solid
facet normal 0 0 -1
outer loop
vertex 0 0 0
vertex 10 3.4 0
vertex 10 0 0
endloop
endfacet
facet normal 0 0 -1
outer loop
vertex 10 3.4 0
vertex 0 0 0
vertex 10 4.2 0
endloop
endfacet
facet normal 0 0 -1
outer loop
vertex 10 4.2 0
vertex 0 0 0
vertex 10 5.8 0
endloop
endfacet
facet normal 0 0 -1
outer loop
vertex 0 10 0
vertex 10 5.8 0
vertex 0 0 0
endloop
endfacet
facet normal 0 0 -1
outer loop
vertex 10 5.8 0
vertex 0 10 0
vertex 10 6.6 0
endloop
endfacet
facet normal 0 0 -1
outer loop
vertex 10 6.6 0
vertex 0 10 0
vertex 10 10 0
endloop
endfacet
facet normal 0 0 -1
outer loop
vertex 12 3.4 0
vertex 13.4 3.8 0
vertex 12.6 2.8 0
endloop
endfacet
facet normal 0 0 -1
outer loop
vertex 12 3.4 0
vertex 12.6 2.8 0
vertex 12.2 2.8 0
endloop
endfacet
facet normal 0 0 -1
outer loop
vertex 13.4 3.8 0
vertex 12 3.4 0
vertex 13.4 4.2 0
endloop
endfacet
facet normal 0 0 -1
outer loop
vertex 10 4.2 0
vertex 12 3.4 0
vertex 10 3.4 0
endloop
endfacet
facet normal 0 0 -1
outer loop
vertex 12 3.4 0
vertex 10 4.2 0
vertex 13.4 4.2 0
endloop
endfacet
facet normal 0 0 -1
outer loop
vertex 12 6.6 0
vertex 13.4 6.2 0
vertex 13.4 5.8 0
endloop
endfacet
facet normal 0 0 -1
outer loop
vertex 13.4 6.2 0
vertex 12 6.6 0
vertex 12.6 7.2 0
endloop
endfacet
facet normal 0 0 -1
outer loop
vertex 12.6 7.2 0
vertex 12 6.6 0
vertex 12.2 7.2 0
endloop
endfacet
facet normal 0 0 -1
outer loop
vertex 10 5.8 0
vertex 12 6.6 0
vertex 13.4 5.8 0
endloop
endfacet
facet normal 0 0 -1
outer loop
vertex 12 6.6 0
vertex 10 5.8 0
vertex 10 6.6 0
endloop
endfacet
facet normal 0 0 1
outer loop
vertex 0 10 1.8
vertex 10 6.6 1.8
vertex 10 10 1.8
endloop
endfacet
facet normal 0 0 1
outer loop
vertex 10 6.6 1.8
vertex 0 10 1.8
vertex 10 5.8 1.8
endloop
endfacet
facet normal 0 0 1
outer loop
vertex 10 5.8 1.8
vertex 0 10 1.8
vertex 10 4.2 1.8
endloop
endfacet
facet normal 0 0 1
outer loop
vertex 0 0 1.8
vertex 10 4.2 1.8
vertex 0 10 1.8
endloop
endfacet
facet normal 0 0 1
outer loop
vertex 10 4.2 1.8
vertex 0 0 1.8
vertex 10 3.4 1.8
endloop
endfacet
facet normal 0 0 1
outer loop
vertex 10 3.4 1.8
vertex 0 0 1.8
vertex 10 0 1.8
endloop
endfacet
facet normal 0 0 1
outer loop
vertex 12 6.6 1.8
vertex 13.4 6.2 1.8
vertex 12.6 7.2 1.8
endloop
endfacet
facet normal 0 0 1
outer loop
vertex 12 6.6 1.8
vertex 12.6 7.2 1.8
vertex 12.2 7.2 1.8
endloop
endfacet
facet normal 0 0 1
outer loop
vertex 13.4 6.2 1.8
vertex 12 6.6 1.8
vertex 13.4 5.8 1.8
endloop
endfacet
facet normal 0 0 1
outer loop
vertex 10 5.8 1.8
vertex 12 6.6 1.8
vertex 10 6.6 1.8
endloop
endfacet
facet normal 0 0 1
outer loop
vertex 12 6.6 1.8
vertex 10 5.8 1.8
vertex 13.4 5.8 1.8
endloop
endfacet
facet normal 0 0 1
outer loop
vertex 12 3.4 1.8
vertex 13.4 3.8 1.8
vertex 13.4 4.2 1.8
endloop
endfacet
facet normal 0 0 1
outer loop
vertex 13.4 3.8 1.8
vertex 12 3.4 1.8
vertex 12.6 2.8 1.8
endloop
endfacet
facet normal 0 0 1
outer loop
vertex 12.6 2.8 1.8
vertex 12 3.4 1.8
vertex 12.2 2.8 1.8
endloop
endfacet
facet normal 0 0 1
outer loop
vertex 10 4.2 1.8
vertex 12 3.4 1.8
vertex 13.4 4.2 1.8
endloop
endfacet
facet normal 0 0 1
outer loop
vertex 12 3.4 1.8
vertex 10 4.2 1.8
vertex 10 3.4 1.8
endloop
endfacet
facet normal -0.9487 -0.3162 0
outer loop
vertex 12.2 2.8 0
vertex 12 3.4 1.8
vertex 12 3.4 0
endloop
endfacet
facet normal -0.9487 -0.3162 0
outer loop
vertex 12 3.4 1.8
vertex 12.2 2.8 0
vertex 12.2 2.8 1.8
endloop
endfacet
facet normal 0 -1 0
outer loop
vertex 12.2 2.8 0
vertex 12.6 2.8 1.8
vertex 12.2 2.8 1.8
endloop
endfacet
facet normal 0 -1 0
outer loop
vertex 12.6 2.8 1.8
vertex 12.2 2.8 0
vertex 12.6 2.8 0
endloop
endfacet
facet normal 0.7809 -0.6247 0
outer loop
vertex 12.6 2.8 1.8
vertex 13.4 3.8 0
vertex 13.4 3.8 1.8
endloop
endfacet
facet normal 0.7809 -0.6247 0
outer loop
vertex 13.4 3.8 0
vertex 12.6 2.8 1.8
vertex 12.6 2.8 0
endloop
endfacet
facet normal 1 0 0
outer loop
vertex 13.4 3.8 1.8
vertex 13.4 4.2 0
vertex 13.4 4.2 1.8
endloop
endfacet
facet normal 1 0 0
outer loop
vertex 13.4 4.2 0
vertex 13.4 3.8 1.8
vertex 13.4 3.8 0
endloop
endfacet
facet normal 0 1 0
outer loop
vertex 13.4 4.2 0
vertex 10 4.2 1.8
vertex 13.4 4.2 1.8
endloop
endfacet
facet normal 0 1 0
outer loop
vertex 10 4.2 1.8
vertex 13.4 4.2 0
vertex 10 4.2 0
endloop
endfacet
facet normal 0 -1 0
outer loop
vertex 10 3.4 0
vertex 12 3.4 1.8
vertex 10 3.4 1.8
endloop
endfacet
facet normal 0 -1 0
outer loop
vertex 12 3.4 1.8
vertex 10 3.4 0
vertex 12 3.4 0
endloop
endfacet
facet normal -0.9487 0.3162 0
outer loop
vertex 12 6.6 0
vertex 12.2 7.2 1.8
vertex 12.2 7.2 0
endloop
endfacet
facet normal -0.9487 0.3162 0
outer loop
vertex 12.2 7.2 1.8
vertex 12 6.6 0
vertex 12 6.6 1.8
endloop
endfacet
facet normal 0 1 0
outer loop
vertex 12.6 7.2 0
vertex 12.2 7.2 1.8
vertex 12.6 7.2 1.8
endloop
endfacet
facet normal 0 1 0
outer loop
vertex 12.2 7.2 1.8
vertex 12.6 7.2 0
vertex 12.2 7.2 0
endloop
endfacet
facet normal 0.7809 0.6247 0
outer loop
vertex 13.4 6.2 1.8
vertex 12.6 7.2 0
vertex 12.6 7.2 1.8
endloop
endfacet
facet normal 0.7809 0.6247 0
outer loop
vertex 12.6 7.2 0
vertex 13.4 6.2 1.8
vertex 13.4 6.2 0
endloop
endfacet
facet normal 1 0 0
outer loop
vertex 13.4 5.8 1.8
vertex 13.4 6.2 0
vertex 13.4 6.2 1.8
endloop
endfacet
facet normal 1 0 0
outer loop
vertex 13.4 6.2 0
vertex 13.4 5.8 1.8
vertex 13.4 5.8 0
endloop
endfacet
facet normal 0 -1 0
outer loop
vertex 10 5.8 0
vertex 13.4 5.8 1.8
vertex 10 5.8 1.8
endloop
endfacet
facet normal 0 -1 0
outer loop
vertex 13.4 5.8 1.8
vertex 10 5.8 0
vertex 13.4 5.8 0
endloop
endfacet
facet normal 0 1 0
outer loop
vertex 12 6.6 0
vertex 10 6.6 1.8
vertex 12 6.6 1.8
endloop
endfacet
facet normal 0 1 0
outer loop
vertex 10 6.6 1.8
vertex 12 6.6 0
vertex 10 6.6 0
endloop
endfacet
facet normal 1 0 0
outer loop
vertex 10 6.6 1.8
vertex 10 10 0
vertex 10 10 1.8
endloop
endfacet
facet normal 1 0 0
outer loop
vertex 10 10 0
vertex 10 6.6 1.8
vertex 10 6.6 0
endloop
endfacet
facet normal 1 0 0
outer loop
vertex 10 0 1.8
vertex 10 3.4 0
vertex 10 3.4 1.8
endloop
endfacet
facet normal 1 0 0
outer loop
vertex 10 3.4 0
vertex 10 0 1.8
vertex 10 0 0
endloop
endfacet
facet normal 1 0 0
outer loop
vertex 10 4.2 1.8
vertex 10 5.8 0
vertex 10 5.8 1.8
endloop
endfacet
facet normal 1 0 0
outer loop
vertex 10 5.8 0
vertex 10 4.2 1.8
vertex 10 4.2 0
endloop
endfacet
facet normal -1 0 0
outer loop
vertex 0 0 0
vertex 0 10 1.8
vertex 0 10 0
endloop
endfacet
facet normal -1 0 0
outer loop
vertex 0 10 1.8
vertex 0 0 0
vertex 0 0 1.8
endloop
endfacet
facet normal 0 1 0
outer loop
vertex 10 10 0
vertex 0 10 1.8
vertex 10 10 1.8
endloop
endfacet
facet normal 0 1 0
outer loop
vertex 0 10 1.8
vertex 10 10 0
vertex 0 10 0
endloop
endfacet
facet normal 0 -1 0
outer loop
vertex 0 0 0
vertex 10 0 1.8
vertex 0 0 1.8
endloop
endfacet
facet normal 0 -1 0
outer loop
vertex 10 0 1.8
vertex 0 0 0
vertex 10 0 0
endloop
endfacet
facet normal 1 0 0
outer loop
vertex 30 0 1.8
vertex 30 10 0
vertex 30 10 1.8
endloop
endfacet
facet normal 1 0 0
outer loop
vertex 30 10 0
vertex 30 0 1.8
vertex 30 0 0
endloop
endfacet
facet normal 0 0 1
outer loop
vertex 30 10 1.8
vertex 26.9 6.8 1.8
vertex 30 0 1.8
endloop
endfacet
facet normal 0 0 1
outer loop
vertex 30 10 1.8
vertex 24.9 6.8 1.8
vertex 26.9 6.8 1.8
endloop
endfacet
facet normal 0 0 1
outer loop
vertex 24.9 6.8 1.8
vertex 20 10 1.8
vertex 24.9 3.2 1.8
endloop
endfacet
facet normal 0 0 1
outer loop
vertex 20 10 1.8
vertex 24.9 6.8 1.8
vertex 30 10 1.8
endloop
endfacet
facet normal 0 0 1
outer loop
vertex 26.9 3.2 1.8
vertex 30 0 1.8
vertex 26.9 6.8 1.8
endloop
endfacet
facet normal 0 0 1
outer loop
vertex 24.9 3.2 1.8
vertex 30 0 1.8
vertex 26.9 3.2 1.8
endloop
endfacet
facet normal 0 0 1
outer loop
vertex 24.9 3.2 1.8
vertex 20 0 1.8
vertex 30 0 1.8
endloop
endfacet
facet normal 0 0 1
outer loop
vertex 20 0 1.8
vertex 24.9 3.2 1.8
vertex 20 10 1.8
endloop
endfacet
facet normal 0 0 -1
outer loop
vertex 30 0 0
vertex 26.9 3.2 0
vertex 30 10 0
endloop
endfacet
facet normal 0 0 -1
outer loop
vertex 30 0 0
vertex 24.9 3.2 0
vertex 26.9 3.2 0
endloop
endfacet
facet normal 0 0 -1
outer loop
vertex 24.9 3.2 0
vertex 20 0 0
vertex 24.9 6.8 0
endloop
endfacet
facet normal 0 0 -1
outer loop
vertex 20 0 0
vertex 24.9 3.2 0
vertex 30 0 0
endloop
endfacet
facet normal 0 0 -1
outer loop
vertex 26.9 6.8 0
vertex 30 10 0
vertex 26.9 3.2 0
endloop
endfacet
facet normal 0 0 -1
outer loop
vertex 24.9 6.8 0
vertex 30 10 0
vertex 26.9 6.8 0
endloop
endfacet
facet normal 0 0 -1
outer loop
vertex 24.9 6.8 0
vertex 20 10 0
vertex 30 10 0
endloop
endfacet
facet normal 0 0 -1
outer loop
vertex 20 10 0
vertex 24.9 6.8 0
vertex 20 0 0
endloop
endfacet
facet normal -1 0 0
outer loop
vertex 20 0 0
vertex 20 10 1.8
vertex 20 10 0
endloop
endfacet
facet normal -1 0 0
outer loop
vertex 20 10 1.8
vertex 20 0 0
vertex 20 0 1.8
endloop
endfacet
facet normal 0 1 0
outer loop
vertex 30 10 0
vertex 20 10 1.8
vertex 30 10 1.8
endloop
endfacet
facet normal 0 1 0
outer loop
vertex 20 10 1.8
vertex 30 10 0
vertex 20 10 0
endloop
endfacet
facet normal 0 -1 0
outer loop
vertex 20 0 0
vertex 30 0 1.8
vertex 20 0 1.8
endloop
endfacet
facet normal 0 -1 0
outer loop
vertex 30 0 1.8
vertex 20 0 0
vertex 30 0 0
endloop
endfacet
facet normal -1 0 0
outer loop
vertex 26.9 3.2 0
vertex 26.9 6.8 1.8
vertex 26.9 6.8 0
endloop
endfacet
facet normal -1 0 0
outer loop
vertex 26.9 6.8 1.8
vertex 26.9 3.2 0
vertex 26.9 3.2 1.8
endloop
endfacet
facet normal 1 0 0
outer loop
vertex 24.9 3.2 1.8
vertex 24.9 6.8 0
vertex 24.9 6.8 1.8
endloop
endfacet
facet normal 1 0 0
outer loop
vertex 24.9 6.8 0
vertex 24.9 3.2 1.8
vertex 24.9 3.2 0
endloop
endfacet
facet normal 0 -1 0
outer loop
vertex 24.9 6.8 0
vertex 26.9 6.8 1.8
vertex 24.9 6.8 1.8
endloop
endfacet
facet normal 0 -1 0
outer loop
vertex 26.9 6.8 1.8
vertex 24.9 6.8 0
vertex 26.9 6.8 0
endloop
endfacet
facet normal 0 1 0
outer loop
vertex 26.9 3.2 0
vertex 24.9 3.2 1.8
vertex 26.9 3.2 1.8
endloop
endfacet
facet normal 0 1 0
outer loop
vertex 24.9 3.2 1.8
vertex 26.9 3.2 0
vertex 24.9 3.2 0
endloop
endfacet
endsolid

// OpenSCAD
/* Clip */

module clip_half(thickness = 1.8) {
  translate([0, -1, 0]) linear_extrude(thickness) {
    polygon([
      [0, 0],
      [0, 4.4],
      [0.4, 4.4],
      [1.4, 3.6],
      [1.4, 3.2],
      [0.8, 1 + 1.8 + 0.2],
      [0.8, 0]
    ]);
  }
}

module clip() {
  rotate([0, 0, -90]) {
    translate([0.8, 0, 0]) clip_half();
    translate([-0.8, 0, 0]) mirror([1, 0, 0]) clip_half();
  }
}

module clip_hole() {
  translate([-0.1, -(0.8 + 0.8 + 0.2), -1]) cube([1.8 + 0.2, 2 * (0.8 + 0.8 + 0.2), 1.8 + 2]);
}

module test_clip_hole() {
  difference() {
    cube([10, 10, 1.8]);
    translate([5, 5, 0]) clip_hole();
  }
}

module test_clip() {
  cube([10, 10, 1.8]);
  translate([10, 5, 0]) clip();
}

test_clip();
//translate([11.8, 0, -5]) rotate([0, -90, 0]) test_clip_hole();

translate([20, 0, 0]) test_clip_hole();
